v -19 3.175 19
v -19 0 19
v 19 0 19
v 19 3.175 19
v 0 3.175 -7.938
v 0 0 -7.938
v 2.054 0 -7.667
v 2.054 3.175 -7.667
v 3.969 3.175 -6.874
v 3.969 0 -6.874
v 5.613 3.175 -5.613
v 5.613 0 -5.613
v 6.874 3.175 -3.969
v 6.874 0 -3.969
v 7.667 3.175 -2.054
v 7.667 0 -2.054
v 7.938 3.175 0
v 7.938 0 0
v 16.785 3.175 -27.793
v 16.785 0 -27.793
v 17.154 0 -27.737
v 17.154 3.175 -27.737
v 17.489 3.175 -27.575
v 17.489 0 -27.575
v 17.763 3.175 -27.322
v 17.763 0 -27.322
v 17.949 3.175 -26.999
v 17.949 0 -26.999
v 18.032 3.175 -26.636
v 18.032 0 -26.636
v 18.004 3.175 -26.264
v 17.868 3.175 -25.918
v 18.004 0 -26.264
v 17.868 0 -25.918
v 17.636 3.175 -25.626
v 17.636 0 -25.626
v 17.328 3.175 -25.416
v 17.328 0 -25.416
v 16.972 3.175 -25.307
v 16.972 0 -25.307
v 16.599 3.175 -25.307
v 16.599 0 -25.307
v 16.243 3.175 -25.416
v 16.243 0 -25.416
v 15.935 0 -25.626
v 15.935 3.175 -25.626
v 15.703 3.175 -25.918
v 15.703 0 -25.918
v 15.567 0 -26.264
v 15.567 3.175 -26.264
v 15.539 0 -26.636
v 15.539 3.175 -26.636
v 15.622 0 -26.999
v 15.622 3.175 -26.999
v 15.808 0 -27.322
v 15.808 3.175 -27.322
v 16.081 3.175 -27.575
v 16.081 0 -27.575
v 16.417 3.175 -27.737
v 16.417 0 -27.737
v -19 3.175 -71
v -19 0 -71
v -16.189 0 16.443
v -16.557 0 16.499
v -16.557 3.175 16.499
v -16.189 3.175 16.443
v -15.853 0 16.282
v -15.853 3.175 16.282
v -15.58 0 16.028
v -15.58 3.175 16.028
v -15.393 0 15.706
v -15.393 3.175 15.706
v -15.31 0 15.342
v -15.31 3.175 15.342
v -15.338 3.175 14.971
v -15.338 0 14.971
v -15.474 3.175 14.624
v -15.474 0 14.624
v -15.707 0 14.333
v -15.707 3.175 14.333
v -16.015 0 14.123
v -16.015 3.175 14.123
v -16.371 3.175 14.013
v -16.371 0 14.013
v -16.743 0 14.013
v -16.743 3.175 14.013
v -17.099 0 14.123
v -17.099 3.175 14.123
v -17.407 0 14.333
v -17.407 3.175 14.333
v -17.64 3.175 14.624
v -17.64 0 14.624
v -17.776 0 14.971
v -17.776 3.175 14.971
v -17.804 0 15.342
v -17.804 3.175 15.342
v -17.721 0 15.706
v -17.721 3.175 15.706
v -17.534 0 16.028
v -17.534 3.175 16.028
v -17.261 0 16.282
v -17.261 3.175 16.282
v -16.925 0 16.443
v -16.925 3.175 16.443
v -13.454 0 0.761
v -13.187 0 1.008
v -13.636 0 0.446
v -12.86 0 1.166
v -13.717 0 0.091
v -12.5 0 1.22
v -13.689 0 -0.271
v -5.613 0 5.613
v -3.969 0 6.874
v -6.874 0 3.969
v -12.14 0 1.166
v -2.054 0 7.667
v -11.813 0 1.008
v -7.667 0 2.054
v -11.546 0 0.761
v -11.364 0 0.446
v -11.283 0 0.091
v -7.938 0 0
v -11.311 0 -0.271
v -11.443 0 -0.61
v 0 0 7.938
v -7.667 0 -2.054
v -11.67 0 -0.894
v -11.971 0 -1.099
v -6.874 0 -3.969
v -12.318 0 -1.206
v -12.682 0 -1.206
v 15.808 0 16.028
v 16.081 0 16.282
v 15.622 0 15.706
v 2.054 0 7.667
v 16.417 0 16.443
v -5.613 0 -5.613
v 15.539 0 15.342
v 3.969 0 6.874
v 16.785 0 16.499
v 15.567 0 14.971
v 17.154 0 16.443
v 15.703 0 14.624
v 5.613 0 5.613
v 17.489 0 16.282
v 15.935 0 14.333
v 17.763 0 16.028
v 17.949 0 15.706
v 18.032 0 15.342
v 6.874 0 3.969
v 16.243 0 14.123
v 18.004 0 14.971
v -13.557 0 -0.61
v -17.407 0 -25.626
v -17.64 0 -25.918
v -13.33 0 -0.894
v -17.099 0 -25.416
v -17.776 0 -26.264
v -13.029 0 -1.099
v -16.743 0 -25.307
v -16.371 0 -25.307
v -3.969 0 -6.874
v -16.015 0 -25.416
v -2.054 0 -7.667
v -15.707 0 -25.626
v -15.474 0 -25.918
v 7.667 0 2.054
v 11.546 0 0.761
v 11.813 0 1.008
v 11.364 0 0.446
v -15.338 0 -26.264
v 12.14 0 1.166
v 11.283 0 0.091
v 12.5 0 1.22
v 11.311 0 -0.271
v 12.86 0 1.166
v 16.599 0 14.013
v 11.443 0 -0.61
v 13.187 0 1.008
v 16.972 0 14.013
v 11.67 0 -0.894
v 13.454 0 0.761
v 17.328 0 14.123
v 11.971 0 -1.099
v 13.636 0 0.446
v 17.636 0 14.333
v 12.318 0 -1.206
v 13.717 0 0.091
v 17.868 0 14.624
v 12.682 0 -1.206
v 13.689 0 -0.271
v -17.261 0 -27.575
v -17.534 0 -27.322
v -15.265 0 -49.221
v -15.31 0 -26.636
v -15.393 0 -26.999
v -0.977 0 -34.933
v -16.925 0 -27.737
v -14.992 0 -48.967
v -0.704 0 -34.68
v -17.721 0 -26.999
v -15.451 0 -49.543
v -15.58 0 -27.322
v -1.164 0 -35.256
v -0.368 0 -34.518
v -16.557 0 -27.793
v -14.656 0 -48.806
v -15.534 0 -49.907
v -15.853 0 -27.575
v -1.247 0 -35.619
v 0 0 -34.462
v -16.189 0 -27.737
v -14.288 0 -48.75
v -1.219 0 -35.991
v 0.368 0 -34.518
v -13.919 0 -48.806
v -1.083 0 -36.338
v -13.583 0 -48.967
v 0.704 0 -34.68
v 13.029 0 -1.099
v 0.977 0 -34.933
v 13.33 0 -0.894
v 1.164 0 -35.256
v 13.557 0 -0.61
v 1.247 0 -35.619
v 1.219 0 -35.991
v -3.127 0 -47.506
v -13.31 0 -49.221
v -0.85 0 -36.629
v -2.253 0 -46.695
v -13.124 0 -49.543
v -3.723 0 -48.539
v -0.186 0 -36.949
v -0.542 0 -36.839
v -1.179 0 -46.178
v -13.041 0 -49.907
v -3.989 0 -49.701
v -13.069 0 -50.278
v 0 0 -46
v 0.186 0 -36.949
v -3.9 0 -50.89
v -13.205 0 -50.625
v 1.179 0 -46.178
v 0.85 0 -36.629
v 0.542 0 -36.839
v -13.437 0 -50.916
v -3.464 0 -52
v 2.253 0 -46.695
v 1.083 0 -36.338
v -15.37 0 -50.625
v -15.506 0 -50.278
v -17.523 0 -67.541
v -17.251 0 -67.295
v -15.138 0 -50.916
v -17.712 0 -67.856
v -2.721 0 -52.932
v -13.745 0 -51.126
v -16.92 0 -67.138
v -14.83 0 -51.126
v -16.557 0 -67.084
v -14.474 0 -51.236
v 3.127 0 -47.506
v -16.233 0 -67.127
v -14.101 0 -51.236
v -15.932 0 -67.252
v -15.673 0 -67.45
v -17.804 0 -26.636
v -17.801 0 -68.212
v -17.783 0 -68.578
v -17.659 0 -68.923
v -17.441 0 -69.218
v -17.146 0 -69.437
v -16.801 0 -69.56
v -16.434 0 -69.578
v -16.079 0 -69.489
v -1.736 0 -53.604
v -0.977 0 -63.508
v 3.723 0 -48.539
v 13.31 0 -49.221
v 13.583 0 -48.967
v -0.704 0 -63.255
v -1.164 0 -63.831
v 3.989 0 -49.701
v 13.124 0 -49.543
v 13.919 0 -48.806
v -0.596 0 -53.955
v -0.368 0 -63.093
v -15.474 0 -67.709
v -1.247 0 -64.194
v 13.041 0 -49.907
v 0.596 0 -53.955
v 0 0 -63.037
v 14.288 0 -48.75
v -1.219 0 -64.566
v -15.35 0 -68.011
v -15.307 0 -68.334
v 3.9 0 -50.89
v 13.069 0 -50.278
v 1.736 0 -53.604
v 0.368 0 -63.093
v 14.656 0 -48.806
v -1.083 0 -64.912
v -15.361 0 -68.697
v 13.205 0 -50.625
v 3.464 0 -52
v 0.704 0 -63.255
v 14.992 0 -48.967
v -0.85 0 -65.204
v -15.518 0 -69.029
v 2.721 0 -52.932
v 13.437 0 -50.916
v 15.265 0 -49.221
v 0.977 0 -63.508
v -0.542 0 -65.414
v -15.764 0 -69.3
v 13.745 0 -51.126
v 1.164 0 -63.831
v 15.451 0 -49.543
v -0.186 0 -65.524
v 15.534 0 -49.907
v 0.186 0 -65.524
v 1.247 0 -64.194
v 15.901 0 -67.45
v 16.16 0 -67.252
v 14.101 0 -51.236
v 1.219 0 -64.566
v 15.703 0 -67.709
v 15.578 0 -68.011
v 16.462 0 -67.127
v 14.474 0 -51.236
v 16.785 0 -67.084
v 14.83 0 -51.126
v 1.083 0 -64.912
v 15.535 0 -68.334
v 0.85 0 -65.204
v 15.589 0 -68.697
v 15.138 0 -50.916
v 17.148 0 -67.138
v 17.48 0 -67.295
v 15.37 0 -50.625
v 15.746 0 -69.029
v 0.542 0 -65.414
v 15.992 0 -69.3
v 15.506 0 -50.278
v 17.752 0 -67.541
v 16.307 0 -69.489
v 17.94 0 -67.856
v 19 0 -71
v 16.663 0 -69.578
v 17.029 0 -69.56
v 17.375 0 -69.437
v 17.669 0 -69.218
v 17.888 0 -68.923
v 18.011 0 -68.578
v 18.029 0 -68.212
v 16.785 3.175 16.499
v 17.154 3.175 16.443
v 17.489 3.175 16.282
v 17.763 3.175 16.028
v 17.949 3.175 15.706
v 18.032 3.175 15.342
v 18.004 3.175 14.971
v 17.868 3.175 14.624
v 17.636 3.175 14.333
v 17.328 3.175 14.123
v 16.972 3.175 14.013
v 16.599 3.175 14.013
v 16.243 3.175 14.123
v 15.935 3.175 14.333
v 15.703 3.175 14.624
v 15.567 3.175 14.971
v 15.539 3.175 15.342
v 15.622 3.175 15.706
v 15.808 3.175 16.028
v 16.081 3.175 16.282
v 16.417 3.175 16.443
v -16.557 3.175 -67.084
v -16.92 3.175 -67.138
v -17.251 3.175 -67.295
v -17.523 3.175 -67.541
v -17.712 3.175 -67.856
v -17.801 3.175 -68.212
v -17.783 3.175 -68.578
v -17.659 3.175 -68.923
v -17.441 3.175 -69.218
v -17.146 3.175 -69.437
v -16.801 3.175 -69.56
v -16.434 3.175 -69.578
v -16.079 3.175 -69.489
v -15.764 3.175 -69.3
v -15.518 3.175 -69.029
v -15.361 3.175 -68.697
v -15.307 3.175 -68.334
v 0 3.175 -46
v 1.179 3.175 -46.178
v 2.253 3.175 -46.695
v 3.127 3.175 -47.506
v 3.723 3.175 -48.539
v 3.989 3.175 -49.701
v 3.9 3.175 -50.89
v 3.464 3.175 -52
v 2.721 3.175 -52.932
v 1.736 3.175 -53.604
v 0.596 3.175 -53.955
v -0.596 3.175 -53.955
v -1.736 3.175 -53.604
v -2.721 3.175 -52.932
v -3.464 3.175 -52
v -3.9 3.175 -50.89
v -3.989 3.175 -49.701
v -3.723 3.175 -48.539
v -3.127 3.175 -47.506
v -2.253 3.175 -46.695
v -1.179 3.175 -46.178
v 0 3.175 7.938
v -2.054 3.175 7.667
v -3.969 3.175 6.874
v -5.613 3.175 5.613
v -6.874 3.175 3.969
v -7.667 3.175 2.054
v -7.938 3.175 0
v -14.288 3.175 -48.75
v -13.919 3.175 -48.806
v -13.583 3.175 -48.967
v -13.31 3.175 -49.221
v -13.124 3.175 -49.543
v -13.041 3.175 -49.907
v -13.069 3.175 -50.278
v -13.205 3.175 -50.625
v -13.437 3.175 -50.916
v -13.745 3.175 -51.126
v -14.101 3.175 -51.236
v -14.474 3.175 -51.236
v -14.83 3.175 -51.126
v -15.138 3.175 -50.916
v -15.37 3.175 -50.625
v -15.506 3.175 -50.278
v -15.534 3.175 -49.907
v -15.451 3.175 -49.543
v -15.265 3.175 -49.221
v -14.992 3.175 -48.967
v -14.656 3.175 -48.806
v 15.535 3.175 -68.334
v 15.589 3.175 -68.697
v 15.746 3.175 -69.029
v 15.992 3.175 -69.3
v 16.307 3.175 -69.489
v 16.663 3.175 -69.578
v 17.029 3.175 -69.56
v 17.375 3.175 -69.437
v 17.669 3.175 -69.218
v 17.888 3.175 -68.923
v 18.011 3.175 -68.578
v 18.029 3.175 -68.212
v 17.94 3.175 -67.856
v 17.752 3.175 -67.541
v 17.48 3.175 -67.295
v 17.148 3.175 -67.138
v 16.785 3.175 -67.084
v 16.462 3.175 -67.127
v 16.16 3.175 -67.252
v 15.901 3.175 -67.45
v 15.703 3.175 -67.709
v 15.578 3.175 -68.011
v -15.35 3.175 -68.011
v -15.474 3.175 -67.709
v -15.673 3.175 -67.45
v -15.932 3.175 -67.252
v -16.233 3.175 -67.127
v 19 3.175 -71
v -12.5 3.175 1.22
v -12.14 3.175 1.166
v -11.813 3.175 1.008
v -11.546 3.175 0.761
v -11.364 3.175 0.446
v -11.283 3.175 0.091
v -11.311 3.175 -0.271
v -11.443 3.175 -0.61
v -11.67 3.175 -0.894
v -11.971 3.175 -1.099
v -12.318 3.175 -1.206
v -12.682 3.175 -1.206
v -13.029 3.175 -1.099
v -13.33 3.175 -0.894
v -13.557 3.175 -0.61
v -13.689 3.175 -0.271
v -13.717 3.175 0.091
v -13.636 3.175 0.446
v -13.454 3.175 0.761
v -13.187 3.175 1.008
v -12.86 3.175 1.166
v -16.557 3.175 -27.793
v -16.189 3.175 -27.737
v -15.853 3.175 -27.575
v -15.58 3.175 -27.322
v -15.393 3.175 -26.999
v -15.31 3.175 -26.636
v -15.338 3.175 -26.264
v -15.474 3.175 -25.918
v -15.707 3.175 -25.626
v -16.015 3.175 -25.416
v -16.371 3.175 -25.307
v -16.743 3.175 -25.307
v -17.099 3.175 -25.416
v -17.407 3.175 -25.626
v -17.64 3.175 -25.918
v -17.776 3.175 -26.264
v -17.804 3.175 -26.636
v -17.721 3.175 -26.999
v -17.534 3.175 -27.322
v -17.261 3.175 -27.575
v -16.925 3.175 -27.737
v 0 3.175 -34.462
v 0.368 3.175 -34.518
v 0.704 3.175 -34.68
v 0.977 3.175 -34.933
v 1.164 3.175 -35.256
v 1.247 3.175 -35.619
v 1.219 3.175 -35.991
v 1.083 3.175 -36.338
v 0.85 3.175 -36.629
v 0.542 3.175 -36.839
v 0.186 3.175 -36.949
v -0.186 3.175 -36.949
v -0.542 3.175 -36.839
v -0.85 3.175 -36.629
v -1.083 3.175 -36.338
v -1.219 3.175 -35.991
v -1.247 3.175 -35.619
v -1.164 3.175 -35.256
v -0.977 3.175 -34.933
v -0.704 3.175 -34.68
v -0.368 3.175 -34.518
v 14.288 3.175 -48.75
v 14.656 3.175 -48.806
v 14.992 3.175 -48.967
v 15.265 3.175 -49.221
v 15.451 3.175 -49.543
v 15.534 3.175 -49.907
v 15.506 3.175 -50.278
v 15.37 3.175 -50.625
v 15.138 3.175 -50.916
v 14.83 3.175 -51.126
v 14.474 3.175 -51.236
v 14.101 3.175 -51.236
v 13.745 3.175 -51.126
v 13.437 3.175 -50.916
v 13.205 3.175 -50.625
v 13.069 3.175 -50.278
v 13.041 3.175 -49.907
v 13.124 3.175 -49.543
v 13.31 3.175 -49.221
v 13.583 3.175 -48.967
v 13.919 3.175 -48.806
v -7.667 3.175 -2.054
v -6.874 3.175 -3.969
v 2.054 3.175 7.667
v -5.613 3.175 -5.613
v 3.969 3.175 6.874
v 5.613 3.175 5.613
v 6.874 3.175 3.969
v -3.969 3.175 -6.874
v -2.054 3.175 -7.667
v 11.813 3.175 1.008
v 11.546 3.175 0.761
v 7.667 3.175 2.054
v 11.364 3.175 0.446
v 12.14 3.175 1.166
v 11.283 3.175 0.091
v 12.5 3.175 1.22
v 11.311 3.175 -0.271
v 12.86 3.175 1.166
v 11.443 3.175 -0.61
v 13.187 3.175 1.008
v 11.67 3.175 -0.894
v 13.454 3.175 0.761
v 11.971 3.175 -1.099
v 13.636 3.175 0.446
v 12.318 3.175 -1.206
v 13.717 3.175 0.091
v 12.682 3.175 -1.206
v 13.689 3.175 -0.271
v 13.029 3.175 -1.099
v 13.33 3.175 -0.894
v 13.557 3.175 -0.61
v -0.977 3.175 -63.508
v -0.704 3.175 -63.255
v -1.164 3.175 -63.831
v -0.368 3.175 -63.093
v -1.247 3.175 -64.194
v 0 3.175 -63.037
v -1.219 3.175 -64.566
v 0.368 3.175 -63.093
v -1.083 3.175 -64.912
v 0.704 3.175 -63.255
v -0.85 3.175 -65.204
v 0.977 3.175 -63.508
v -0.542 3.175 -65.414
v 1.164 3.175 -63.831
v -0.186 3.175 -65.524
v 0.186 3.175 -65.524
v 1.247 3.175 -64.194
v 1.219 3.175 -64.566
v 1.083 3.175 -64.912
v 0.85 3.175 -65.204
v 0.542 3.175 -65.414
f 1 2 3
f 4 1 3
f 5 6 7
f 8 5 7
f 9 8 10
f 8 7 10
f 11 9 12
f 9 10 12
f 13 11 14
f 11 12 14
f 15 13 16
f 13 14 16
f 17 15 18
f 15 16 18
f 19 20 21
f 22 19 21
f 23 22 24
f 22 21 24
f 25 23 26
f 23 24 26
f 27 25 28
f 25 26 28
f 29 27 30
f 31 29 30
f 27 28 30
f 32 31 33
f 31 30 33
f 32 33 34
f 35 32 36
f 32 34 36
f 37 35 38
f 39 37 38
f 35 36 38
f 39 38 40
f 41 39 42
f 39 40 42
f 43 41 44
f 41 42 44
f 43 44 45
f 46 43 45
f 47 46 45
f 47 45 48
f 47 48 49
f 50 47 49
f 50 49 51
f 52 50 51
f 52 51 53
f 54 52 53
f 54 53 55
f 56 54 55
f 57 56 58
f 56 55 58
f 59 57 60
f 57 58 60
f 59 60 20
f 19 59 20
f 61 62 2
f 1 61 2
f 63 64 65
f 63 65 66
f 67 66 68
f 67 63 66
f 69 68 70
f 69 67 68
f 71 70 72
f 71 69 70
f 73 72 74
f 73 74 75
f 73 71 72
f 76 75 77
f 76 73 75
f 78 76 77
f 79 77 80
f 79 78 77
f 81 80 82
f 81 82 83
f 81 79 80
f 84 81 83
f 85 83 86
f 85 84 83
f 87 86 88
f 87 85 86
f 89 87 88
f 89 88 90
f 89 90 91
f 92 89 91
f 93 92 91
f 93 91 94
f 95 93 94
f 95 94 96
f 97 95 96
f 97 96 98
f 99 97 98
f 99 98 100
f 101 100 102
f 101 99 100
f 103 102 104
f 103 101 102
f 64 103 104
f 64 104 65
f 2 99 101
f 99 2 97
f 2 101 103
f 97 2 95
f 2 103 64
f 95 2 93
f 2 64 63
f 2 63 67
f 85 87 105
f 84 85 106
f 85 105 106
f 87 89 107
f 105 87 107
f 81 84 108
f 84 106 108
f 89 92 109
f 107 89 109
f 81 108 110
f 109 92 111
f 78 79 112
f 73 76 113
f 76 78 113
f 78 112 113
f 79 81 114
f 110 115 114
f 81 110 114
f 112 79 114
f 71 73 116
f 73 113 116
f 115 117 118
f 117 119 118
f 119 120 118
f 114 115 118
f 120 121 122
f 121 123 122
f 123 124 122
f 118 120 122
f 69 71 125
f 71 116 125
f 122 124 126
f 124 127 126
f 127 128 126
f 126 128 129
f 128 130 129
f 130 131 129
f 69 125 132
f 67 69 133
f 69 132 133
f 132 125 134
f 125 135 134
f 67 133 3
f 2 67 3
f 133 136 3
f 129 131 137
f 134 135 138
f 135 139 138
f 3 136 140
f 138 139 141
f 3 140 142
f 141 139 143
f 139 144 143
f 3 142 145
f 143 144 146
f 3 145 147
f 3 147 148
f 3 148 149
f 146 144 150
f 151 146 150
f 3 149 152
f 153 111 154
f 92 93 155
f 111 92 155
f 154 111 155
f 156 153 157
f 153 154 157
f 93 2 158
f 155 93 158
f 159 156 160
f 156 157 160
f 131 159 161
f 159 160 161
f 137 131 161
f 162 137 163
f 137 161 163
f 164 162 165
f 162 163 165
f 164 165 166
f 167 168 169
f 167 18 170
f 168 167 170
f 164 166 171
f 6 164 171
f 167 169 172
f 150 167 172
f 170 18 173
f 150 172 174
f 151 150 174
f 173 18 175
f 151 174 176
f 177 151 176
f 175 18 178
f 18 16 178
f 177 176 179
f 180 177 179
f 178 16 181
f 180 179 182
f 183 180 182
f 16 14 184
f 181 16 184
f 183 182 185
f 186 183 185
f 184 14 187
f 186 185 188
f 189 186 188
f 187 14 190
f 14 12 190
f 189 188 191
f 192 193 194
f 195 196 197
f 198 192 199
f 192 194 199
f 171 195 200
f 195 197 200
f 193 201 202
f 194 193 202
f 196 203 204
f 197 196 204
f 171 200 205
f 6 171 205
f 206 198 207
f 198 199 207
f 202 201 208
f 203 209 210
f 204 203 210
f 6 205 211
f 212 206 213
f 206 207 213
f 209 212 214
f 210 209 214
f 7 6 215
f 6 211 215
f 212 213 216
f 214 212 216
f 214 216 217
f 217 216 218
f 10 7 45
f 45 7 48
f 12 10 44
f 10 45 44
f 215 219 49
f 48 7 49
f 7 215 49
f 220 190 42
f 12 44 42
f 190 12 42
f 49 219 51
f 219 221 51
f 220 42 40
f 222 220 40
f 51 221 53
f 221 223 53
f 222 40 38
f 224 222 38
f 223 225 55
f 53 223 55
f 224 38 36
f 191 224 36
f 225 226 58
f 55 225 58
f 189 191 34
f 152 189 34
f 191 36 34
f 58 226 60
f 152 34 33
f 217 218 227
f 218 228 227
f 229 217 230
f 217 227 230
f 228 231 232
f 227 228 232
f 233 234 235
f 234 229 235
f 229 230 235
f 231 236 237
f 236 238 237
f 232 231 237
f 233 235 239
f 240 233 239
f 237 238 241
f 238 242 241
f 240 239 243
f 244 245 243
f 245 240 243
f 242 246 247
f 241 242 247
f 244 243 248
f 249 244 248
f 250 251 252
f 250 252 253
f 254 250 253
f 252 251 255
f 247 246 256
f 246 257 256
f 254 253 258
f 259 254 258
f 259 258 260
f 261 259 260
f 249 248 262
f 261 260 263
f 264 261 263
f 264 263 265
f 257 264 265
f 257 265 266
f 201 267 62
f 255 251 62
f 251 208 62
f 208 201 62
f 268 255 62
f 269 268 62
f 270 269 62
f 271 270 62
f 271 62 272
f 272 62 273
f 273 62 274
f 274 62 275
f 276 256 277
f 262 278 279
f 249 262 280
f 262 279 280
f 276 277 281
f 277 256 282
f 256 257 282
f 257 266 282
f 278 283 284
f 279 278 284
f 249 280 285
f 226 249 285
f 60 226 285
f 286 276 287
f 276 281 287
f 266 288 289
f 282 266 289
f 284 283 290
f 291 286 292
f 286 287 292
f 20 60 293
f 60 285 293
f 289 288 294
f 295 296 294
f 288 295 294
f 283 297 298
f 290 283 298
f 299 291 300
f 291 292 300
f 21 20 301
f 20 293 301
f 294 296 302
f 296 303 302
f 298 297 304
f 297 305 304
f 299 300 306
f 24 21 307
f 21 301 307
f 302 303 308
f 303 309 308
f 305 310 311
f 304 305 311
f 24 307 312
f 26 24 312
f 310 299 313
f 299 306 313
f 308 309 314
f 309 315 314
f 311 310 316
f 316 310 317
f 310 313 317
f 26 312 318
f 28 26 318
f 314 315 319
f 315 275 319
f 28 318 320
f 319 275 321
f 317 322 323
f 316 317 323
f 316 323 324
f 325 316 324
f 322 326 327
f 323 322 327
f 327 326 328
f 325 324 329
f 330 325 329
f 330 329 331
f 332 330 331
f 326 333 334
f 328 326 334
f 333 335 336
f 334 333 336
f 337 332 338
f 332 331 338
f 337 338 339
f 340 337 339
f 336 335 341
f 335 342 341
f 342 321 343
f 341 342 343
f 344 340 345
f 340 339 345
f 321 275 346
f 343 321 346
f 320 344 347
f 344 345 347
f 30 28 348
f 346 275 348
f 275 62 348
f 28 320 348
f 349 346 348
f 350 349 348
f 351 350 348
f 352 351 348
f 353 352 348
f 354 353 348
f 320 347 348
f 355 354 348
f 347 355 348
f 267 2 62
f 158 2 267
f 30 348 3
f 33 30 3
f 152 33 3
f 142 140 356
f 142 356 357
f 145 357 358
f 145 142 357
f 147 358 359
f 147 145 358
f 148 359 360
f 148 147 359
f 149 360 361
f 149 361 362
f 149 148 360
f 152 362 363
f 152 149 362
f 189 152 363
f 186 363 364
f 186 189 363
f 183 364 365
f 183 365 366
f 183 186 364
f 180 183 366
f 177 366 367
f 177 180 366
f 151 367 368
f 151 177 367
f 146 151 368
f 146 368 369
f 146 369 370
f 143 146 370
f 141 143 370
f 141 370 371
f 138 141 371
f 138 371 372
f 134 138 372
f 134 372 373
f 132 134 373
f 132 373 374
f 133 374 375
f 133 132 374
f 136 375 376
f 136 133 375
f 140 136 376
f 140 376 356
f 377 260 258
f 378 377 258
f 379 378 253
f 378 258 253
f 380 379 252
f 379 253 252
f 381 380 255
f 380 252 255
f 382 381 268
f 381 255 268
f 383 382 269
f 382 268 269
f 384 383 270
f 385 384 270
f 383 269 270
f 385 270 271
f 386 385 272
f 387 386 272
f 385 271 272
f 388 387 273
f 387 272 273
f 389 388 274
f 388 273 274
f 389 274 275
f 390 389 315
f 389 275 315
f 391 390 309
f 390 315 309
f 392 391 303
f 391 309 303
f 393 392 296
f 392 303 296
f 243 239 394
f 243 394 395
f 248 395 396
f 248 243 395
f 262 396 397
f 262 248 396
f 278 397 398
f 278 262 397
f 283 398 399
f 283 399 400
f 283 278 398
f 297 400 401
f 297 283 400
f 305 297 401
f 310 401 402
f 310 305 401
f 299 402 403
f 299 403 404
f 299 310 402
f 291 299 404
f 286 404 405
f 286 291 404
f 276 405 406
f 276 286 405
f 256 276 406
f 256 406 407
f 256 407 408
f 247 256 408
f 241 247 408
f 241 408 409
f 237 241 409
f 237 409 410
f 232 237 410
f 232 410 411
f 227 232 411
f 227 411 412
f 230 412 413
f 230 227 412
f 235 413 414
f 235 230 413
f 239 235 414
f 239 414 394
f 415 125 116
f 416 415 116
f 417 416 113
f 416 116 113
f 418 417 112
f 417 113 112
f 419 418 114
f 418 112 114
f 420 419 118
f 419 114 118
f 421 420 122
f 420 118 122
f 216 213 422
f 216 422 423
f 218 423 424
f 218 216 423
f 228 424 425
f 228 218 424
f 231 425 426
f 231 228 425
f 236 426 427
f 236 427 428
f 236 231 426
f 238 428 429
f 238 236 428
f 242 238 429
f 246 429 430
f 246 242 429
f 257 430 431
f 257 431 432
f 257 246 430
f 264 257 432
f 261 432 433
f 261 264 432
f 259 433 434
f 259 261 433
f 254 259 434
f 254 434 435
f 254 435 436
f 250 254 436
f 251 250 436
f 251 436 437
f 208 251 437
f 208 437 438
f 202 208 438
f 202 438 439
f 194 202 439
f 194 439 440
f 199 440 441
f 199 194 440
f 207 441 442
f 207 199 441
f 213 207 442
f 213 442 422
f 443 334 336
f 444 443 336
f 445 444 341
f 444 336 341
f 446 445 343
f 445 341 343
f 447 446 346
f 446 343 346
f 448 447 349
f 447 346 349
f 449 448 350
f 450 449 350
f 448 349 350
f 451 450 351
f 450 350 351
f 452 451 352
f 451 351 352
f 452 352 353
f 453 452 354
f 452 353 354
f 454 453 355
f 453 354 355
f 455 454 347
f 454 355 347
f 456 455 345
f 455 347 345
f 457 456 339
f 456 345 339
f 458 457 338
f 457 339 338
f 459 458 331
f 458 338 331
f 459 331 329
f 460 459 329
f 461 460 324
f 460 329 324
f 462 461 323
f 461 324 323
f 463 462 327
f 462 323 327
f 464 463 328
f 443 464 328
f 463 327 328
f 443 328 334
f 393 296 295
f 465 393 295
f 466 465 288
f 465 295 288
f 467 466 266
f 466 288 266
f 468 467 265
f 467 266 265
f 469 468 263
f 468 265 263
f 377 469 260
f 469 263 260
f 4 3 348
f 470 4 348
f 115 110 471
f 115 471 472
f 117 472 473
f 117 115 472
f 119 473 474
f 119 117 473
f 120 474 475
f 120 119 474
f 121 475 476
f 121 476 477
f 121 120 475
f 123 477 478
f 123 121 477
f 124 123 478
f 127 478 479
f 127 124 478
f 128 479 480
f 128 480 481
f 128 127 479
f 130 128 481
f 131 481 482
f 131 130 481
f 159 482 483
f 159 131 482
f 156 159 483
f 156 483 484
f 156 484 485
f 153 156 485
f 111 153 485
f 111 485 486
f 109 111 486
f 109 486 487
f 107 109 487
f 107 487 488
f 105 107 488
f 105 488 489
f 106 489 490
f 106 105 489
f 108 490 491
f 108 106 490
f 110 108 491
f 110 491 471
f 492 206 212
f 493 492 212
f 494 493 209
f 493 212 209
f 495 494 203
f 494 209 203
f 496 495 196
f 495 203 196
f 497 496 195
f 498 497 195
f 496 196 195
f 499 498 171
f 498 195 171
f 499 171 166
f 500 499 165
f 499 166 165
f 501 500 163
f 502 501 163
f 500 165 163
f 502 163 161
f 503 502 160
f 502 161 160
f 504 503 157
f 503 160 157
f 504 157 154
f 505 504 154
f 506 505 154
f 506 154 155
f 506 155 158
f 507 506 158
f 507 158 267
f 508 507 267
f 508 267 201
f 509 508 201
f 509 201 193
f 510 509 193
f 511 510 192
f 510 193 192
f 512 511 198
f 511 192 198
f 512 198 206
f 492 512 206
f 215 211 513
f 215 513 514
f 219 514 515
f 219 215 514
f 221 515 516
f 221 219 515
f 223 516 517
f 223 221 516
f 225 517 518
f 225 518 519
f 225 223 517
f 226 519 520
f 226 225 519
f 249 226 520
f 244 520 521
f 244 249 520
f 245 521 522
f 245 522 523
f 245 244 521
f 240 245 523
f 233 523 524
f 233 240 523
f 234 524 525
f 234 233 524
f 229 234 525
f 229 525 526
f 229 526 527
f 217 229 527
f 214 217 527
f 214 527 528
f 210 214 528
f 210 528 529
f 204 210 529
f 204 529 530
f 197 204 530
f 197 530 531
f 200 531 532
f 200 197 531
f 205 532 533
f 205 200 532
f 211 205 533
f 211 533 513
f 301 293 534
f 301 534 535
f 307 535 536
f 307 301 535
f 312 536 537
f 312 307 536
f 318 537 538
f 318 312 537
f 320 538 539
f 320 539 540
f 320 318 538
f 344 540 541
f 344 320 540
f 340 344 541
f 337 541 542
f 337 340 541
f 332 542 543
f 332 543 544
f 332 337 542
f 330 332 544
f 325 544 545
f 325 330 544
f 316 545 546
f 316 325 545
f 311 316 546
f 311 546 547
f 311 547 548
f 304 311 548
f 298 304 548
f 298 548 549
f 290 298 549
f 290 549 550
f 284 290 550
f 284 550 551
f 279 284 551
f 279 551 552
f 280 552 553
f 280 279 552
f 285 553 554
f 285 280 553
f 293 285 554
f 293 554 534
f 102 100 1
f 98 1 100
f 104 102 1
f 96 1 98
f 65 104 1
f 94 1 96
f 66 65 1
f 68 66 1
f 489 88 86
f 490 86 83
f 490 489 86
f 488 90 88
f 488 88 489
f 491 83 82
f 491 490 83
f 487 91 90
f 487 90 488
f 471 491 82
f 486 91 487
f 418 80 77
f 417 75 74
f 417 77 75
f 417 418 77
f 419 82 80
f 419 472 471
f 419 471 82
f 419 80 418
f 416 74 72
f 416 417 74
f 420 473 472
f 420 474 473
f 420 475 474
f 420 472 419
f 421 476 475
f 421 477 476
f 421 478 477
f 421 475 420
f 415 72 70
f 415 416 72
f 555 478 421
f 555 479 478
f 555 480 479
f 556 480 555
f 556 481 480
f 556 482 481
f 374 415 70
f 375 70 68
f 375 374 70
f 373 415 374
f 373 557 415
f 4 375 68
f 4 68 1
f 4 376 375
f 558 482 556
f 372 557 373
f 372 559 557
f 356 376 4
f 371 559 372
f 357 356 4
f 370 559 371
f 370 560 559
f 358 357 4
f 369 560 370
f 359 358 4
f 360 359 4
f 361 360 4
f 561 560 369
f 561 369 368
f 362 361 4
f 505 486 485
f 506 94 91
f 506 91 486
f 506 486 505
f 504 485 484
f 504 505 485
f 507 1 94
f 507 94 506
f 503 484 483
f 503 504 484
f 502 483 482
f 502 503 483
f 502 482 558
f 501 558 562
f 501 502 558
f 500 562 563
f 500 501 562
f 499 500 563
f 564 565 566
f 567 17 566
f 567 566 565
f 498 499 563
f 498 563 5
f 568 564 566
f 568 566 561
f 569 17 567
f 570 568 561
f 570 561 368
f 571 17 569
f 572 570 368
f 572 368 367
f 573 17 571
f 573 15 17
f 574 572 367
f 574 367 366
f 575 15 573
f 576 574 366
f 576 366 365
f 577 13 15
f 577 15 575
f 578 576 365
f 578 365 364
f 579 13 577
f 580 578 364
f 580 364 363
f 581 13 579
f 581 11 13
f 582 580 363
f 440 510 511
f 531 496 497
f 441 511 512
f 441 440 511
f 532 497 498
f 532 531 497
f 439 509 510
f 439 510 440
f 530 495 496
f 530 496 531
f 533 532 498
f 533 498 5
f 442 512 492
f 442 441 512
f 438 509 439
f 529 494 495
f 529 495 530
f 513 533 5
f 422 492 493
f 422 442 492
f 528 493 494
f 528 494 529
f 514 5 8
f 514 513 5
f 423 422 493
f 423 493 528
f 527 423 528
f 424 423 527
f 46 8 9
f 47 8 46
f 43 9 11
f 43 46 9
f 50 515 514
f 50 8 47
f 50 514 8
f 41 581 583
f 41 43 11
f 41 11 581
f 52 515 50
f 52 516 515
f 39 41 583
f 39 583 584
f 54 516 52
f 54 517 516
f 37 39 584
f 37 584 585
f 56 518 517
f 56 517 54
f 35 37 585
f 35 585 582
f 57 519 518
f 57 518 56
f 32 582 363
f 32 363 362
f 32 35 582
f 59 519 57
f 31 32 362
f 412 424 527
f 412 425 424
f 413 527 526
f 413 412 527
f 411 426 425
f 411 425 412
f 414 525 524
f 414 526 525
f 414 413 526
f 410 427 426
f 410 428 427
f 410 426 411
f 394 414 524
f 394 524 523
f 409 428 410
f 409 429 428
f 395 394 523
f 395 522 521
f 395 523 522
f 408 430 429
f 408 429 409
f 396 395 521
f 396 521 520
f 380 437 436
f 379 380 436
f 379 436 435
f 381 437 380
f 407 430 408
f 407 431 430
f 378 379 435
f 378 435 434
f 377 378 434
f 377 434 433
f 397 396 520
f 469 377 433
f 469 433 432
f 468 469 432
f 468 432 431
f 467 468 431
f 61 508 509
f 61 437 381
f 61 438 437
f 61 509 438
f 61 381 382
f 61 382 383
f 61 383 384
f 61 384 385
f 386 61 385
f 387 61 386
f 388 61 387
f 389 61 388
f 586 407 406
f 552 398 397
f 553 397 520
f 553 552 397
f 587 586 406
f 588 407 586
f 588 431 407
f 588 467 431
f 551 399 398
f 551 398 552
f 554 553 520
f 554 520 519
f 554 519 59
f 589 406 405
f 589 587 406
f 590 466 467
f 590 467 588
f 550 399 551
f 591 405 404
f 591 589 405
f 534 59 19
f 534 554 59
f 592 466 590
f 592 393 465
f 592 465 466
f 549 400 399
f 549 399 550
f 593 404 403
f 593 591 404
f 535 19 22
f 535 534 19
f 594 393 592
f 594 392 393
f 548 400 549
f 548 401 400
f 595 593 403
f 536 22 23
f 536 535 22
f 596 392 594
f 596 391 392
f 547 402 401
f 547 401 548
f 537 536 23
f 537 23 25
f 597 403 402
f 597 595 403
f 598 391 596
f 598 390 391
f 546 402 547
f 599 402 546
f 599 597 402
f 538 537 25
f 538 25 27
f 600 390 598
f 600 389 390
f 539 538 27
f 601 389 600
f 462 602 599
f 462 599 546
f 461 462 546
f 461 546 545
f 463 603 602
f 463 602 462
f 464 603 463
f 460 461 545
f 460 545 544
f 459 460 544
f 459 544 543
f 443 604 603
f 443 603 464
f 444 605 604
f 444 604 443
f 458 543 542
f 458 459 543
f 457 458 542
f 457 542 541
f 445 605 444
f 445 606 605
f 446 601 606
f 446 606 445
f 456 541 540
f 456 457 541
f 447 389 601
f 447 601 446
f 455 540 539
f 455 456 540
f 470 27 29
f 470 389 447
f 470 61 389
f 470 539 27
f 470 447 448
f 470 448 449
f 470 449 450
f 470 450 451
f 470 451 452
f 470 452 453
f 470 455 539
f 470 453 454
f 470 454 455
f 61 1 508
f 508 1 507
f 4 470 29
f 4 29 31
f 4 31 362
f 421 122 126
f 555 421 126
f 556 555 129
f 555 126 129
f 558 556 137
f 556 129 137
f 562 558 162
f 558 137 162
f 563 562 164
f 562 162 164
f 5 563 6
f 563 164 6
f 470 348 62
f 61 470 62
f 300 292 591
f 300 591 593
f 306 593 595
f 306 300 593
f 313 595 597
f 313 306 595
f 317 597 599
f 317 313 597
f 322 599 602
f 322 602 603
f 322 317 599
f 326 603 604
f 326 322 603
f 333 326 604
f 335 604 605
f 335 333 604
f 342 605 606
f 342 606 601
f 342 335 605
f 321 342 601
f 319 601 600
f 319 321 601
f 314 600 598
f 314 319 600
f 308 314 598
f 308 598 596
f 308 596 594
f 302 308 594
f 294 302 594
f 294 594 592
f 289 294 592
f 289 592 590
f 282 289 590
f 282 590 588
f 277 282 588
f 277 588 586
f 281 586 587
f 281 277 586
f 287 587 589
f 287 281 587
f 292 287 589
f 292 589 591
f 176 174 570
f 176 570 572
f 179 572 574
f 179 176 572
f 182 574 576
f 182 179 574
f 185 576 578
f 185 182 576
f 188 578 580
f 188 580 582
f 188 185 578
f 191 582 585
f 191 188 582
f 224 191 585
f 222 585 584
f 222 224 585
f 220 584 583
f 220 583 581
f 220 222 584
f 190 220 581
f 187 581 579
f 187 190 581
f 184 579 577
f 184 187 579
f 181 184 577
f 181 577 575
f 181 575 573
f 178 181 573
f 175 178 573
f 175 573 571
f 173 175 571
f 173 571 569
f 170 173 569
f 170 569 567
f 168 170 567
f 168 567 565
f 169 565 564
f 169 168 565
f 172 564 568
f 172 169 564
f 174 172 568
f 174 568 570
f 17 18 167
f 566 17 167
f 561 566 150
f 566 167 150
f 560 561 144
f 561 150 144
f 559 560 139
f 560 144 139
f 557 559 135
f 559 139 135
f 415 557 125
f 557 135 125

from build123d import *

# Parameters (mm, degrees)
SKETCH1_R           = 1.25
SKETCH1_R_2         = 1.22
SKETCH1_R_3         = 4
BOSS_EXTRUDE1_DEPTH = 3.175


with BuildPart() as part:
    # Sketch1 → Boss-Extrude1 (new body)
    with BuildSketch(Plane(origin=(0, 0, 0), x_dir=(1, 0, 0), z_dir=(0, 1, 0))):
        Polygon((-19, -19), (0, -19), (19, -19), (19, 71), (-19, 71), align=None)
        with Locations((-16.556995364, -15.248859434)):
            Circle(SKETCH1_R, mode=Mode.SUBTRACT)
        with Locations((-12.5, 0)):
            Circle(SKETCH1_R_2, mode=Mode.SUBTRACT)
        with BuildLine():
            ThreePointArc((7.9375, 0), (5.612660076, -5.612660076), (0, -7.9375))
            ThreePointArc((0, -7.9375), (-5.612660076, -5.612660076), (-7.9375, 0))
            ThreePointArc((-7.9375, 0), (-5.612660076, 5.612660076), (0, 7.9375))
            ThreePointArc((0, 7.9375), (5.612660076, 5.612660076), (7.9375, 0))
        make_face(mode=Mode.SUBTRACT)
        with Locations((16.785315207, -15.248859434)):
            Circle(SKETCH1_R, mode=Mode.SUBTRACT)
        with Locations((12.5, 0)):
            Circle(SKETCH1_R_2, mode=Mode.SUBTRACT)
        with BuildLine():
            ThreePointArc((-16.556995364, 25.292624917), (-17.806995364, 26.542624917), (-16.556995364, 27.792624917))
            ThreePointArc((-16.556995364, 27.792624917), (-15.306995364, 26.542624917), (-16.556995364, 25.292624917))
        make_face(mode=Mode.SUBTRACT)
        with BuildLine():
            ThreePointArc((-16.556995364, 67.084109267), (-17.440878841, 69.217992744), (-15.306995364, 68.334109267))
            ThreePointArc((-15.306995364, 68.334109267), (-15.673111888, 67.450225791), (-16.556995364, 67.084109267))
        make_face(mode=Mode.SUBTRACT)
        with BuildLine():
            ThreePointArc((16.785315207, 25.292624917), (15.535315207, 26.542624917), (16.785315207, 27.792624917))
            ThreePointArc((16.785315207, 27.792624917), (18.035315207, 26.542624917), (16.785315207, 25.292624917))
        make_face(mode=Mode.SUBTRACT)
        with Locations((0, 35.7125)):
            Circle(SKETCH1_R, mode=Mode.SUBTRACT)
        with Locations((14.2875, 50)):
            Circle(SKETCH1_R, mode=Mode.SUBTRACT)
        with Locations((0, 64.2875)):
            Circle(SKETCH1_R, mode=Mode.SUBTRACT)
        with Locations((-14.2875, 50)):
            Circle(SKETCH1_R, mode=Mode.SUBTRACT)
        with BuildLine():
            ThreePointArc((16.785315207, 67.084109267), (15.90143173, 67.450225791), (15.535315207, 68.334109267))
            ThreePointArc((15.535315207, 68.334109267), (17.669198683, 69.217992744), (16.785315207, 67.084109267))
        make_face(mode=Mode.SUBTRACT)
        with Locations((0, 50)):
            Circle(SKETCH1_R_3, mode=Mode.SUBTRACT)
    extrude(amount=BOSS_EXTRUDE1_DEPTH)


solid = part.part
